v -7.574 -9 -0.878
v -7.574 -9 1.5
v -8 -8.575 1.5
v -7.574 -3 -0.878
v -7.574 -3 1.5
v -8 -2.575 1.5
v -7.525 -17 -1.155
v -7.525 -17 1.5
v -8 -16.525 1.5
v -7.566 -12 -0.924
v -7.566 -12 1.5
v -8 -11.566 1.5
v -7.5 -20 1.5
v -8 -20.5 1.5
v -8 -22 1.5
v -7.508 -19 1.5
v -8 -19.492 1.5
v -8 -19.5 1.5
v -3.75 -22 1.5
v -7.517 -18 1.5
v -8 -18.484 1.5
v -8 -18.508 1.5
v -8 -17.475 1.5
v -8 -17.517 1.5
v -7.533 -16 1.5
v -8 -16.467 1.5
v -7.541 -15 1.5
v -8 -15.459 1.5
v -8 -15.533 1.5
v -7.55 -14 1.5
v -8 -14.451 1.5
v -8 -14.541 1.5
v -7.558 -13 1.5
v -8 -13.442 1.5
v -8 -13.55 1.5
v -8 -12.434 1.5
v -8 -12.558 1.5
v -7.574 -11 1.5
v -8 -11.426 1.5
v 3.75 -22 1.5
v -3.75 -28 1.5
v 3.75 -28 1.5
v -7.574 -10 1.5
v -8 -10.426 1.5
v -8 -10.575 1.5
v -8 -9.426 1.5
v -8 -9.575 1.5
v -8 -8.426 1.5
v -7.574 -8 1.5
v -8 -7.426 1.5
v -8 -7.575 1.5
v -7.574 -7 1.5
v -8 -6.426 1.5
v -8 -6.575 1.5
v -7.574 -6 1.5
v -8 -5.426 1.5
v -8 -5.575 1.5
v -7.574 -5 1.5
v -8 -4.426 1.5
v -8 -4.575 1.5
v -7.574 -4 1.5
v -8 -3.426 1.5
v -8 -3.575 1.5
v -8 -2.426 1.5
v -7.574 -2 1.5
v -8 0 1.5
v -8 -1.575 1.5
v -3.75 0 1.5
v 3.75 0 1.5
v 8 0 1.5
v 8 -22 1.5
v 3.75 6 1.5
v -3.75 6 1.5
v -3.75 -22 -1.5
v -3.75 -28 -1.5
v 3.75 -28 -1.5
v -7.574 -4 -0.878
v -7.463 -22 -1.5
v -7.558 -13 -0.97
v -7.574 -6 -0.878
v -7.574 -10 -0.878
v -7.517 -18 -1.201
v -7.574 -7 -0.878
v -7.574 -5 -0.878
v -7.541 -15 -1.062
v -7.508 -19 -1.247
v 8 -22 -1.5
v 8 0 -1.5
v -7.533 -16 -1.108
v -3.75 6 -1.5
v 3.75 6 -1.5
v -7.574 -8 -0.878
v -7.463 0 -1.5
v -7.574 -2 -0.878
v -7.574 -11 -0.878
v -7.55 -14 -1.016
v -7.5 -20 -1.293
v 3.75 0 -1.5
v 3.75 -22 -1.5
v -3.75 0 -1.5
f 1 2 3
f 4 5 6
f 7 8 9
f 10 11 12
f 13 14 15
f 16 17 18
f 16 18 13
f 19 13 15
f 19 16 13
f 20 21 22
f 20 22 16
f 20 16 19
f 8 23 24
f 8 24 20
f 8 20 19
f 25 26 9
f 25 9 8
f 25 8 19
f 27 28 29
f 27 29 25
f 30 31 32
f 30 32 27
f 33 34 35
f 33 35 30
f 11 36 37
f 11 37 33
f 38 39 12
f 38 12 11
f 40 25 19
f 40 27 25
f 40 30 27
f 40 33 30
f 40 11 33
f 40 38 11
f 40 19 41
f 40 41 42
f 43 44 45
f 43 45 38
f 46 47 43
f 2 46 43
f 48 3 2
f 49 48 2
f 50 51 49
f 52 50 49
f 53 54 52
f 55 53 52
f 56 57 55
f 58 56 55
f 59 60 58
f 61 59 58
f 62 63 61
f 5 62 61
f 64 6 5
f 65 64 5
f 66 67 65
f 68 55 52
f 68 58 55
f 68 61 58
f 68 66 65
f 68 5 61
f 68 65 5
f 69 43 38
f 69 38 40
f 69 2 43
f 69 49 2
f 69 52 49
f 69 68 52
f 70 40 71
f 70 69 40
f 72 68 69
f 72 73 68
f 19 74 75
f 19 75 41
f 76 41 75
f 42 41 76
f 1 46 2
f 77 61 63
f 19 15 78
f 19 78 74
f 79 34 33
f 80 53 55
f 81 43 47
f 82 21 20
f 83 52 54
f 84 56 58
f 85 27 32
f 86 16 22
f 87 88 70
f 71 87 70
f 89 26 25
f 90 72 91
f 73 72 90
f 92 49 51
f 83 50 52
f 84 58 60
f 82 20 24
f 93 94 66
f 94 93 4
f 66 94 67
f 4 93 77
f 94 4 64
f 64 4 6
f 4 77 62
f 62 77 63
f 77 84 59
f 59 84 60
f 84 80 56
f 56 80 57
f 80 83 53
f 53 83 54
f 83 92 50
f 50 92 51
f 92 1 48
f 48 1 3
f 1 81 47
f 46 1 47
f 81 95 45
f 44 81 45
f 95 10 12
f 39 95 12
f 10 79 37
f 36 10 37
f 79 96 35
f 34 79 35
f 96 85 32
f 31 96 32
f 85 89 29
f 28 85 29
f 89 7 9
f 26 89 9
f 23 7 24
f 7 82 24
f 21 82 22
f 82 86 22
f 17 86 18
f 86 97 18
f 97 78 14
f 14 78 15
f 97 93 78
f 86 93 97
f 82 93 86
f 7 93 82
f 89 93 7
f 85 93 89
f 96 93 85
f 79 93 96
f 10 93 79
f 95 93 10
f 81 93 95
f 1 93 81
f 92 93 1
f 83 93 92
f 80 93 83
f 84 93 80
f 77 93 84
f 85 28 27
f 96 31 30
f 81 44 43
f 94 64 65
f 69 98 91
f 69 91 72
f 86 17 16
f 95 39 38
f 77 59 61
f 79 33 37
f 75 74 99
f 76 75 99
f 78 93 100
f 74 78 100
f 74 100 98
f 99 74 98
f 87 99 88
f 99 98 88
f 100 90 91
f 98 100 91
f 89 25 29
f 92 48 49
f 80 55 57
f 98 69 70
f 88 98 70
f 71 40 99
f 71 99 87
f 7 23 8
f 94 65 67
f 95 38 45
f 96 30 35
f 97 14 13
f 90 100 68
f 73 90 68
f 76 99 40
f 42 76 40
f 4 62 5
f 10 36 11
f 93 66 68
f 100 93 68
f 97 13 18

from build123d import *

# Parameters (mm, degrees)
F0_W     = 16
F0_H     = 3
F1_DEPTH = 22
F2_W     = 7.5
F2_H     = 3
F3_DEPTH = 6
F4_W     = 7.5
F4_H     = 3
F5_DEPTH = 6
F7_DEPTH = 3.001
F9_DEPTH = 28.001


with BuildPart() as f1:
    # F0 (on Front) → F1 (new body)
    with BuildSketch(Plane.XZ):
        Rectangle(F0_W, F0_H)
    extrude(amount=F1_DEPTH)

    # F2 (on face) → F3 (join)
    with BuildSketch(Plane.XZ.offset(22)):
        Rectangle(F2_W, F2_H)
    extrude(amount=F3_DEPTH)

    # F4 (on face) → F5 (join)
    with BuildSketch(Plane(origin=(0, 0, 0), x_dir=(-1, 0, 0), z_dir=(0, 1, 0))):
        Rectangle(F4_W, F4_H)
    extrude(amount=F5_DEPTH)

    # F6 (on face) → F7 (cut, through all)
    with BuildSketch(Plane.XY.offset(1.5)):
        Polygon((-8, -1.5746736809), (-8, -2.4259408148), (-7.574366433, -2.0003072478), align=None)
        Polygon((-8, -2.5746736809), (-8, -3.4259408148), (-7.574366433, -3.0003072478), align=None)
        Polygon((-8, -3.5746736809), (-8, -4.4259408148), (-7.574366433, -4.0003072478), align=None)
        Polygon((-8, -4.5746736809), (-8, -5.4259408148), (-7.574366433, -5.0003072478), align=None)
        Polygon((-8, -5.5746736809), (-8, -6.4259408148), (-7.574366433, -6.0003072478), align=None)
        Polygon((-8, -6.5746736809), (-8, -7.4259408148), (-7.574366433, -7.0003072478), align=None)
        Polygon((-8, -7.5746736809), (-8, -8.4259408148), (-7.574366433, -8.0003072478), align=None)
        Polygon((-8, -8.5746736809), (-8, -9.4259408148), (-7.574366433, -9.0003072478), align=None)
        Polygon((-8, -9.5746736808), (-8, -10.4259408148), (-7.574366433, -10.0003072478), align=None)
        Polygon((-7.574366433, -11.0003072478), (-8, -10.5746736808), (-8, -11.4259408148), align=None)
        Polygon((-7.566103496, -12.0002731092), (-8, -11.5663766052), (-8, -12.4341696131), align=None)
        Polygon((-7.557840559, -13.0002389705), (-8, -12.5580795295), (-8, -13.4423984115), align=None)
        Polygon((-7.549577622, -14.0002048319), (-8, -13.5497824539), (-8, -14.4506272099), align=None)
        Polygon((-7.541314685, -15.0001706932), (-8, -14.5414853782), (-8, -15.4588560082), align=None)
        Polygon((-7.5, -20), (-8, -19.5), (-8, -20.5), align=None)
        Polygon((-7.508262937, -19.0000341386), (-8, -18.5082970756), (-8, -19.4917712016), align=None)
        Polygon((-7.516525874, -18.0000682773), (-8, -17.5165941513), (-8, -18.4835424033), align=None)
        Polygon((-7.524788811, -17.0001024159), (-8, -16.5248912269), (-8, -17.4753136049), align=None)
        Polygon((-7.533051748, -16.0001365546), (-8, -15.5331883026), (-8, -16.4670848066), align=None)
    extrude(amount=-F7_DEPTH, mode=Mode.SUBTRACT)

    # F8 (on face) → F9 (cut, through all)
    with BuildSketch(Plane.XZ.offset(22)):
        Polygon((-7.4629583396, -1.5), (-8, 1.5), (-8, -1.5), align=None)
    extrude(amount=-F9_DEPTH, mode=Mode.SUBTRACT)


solid = f1.part
